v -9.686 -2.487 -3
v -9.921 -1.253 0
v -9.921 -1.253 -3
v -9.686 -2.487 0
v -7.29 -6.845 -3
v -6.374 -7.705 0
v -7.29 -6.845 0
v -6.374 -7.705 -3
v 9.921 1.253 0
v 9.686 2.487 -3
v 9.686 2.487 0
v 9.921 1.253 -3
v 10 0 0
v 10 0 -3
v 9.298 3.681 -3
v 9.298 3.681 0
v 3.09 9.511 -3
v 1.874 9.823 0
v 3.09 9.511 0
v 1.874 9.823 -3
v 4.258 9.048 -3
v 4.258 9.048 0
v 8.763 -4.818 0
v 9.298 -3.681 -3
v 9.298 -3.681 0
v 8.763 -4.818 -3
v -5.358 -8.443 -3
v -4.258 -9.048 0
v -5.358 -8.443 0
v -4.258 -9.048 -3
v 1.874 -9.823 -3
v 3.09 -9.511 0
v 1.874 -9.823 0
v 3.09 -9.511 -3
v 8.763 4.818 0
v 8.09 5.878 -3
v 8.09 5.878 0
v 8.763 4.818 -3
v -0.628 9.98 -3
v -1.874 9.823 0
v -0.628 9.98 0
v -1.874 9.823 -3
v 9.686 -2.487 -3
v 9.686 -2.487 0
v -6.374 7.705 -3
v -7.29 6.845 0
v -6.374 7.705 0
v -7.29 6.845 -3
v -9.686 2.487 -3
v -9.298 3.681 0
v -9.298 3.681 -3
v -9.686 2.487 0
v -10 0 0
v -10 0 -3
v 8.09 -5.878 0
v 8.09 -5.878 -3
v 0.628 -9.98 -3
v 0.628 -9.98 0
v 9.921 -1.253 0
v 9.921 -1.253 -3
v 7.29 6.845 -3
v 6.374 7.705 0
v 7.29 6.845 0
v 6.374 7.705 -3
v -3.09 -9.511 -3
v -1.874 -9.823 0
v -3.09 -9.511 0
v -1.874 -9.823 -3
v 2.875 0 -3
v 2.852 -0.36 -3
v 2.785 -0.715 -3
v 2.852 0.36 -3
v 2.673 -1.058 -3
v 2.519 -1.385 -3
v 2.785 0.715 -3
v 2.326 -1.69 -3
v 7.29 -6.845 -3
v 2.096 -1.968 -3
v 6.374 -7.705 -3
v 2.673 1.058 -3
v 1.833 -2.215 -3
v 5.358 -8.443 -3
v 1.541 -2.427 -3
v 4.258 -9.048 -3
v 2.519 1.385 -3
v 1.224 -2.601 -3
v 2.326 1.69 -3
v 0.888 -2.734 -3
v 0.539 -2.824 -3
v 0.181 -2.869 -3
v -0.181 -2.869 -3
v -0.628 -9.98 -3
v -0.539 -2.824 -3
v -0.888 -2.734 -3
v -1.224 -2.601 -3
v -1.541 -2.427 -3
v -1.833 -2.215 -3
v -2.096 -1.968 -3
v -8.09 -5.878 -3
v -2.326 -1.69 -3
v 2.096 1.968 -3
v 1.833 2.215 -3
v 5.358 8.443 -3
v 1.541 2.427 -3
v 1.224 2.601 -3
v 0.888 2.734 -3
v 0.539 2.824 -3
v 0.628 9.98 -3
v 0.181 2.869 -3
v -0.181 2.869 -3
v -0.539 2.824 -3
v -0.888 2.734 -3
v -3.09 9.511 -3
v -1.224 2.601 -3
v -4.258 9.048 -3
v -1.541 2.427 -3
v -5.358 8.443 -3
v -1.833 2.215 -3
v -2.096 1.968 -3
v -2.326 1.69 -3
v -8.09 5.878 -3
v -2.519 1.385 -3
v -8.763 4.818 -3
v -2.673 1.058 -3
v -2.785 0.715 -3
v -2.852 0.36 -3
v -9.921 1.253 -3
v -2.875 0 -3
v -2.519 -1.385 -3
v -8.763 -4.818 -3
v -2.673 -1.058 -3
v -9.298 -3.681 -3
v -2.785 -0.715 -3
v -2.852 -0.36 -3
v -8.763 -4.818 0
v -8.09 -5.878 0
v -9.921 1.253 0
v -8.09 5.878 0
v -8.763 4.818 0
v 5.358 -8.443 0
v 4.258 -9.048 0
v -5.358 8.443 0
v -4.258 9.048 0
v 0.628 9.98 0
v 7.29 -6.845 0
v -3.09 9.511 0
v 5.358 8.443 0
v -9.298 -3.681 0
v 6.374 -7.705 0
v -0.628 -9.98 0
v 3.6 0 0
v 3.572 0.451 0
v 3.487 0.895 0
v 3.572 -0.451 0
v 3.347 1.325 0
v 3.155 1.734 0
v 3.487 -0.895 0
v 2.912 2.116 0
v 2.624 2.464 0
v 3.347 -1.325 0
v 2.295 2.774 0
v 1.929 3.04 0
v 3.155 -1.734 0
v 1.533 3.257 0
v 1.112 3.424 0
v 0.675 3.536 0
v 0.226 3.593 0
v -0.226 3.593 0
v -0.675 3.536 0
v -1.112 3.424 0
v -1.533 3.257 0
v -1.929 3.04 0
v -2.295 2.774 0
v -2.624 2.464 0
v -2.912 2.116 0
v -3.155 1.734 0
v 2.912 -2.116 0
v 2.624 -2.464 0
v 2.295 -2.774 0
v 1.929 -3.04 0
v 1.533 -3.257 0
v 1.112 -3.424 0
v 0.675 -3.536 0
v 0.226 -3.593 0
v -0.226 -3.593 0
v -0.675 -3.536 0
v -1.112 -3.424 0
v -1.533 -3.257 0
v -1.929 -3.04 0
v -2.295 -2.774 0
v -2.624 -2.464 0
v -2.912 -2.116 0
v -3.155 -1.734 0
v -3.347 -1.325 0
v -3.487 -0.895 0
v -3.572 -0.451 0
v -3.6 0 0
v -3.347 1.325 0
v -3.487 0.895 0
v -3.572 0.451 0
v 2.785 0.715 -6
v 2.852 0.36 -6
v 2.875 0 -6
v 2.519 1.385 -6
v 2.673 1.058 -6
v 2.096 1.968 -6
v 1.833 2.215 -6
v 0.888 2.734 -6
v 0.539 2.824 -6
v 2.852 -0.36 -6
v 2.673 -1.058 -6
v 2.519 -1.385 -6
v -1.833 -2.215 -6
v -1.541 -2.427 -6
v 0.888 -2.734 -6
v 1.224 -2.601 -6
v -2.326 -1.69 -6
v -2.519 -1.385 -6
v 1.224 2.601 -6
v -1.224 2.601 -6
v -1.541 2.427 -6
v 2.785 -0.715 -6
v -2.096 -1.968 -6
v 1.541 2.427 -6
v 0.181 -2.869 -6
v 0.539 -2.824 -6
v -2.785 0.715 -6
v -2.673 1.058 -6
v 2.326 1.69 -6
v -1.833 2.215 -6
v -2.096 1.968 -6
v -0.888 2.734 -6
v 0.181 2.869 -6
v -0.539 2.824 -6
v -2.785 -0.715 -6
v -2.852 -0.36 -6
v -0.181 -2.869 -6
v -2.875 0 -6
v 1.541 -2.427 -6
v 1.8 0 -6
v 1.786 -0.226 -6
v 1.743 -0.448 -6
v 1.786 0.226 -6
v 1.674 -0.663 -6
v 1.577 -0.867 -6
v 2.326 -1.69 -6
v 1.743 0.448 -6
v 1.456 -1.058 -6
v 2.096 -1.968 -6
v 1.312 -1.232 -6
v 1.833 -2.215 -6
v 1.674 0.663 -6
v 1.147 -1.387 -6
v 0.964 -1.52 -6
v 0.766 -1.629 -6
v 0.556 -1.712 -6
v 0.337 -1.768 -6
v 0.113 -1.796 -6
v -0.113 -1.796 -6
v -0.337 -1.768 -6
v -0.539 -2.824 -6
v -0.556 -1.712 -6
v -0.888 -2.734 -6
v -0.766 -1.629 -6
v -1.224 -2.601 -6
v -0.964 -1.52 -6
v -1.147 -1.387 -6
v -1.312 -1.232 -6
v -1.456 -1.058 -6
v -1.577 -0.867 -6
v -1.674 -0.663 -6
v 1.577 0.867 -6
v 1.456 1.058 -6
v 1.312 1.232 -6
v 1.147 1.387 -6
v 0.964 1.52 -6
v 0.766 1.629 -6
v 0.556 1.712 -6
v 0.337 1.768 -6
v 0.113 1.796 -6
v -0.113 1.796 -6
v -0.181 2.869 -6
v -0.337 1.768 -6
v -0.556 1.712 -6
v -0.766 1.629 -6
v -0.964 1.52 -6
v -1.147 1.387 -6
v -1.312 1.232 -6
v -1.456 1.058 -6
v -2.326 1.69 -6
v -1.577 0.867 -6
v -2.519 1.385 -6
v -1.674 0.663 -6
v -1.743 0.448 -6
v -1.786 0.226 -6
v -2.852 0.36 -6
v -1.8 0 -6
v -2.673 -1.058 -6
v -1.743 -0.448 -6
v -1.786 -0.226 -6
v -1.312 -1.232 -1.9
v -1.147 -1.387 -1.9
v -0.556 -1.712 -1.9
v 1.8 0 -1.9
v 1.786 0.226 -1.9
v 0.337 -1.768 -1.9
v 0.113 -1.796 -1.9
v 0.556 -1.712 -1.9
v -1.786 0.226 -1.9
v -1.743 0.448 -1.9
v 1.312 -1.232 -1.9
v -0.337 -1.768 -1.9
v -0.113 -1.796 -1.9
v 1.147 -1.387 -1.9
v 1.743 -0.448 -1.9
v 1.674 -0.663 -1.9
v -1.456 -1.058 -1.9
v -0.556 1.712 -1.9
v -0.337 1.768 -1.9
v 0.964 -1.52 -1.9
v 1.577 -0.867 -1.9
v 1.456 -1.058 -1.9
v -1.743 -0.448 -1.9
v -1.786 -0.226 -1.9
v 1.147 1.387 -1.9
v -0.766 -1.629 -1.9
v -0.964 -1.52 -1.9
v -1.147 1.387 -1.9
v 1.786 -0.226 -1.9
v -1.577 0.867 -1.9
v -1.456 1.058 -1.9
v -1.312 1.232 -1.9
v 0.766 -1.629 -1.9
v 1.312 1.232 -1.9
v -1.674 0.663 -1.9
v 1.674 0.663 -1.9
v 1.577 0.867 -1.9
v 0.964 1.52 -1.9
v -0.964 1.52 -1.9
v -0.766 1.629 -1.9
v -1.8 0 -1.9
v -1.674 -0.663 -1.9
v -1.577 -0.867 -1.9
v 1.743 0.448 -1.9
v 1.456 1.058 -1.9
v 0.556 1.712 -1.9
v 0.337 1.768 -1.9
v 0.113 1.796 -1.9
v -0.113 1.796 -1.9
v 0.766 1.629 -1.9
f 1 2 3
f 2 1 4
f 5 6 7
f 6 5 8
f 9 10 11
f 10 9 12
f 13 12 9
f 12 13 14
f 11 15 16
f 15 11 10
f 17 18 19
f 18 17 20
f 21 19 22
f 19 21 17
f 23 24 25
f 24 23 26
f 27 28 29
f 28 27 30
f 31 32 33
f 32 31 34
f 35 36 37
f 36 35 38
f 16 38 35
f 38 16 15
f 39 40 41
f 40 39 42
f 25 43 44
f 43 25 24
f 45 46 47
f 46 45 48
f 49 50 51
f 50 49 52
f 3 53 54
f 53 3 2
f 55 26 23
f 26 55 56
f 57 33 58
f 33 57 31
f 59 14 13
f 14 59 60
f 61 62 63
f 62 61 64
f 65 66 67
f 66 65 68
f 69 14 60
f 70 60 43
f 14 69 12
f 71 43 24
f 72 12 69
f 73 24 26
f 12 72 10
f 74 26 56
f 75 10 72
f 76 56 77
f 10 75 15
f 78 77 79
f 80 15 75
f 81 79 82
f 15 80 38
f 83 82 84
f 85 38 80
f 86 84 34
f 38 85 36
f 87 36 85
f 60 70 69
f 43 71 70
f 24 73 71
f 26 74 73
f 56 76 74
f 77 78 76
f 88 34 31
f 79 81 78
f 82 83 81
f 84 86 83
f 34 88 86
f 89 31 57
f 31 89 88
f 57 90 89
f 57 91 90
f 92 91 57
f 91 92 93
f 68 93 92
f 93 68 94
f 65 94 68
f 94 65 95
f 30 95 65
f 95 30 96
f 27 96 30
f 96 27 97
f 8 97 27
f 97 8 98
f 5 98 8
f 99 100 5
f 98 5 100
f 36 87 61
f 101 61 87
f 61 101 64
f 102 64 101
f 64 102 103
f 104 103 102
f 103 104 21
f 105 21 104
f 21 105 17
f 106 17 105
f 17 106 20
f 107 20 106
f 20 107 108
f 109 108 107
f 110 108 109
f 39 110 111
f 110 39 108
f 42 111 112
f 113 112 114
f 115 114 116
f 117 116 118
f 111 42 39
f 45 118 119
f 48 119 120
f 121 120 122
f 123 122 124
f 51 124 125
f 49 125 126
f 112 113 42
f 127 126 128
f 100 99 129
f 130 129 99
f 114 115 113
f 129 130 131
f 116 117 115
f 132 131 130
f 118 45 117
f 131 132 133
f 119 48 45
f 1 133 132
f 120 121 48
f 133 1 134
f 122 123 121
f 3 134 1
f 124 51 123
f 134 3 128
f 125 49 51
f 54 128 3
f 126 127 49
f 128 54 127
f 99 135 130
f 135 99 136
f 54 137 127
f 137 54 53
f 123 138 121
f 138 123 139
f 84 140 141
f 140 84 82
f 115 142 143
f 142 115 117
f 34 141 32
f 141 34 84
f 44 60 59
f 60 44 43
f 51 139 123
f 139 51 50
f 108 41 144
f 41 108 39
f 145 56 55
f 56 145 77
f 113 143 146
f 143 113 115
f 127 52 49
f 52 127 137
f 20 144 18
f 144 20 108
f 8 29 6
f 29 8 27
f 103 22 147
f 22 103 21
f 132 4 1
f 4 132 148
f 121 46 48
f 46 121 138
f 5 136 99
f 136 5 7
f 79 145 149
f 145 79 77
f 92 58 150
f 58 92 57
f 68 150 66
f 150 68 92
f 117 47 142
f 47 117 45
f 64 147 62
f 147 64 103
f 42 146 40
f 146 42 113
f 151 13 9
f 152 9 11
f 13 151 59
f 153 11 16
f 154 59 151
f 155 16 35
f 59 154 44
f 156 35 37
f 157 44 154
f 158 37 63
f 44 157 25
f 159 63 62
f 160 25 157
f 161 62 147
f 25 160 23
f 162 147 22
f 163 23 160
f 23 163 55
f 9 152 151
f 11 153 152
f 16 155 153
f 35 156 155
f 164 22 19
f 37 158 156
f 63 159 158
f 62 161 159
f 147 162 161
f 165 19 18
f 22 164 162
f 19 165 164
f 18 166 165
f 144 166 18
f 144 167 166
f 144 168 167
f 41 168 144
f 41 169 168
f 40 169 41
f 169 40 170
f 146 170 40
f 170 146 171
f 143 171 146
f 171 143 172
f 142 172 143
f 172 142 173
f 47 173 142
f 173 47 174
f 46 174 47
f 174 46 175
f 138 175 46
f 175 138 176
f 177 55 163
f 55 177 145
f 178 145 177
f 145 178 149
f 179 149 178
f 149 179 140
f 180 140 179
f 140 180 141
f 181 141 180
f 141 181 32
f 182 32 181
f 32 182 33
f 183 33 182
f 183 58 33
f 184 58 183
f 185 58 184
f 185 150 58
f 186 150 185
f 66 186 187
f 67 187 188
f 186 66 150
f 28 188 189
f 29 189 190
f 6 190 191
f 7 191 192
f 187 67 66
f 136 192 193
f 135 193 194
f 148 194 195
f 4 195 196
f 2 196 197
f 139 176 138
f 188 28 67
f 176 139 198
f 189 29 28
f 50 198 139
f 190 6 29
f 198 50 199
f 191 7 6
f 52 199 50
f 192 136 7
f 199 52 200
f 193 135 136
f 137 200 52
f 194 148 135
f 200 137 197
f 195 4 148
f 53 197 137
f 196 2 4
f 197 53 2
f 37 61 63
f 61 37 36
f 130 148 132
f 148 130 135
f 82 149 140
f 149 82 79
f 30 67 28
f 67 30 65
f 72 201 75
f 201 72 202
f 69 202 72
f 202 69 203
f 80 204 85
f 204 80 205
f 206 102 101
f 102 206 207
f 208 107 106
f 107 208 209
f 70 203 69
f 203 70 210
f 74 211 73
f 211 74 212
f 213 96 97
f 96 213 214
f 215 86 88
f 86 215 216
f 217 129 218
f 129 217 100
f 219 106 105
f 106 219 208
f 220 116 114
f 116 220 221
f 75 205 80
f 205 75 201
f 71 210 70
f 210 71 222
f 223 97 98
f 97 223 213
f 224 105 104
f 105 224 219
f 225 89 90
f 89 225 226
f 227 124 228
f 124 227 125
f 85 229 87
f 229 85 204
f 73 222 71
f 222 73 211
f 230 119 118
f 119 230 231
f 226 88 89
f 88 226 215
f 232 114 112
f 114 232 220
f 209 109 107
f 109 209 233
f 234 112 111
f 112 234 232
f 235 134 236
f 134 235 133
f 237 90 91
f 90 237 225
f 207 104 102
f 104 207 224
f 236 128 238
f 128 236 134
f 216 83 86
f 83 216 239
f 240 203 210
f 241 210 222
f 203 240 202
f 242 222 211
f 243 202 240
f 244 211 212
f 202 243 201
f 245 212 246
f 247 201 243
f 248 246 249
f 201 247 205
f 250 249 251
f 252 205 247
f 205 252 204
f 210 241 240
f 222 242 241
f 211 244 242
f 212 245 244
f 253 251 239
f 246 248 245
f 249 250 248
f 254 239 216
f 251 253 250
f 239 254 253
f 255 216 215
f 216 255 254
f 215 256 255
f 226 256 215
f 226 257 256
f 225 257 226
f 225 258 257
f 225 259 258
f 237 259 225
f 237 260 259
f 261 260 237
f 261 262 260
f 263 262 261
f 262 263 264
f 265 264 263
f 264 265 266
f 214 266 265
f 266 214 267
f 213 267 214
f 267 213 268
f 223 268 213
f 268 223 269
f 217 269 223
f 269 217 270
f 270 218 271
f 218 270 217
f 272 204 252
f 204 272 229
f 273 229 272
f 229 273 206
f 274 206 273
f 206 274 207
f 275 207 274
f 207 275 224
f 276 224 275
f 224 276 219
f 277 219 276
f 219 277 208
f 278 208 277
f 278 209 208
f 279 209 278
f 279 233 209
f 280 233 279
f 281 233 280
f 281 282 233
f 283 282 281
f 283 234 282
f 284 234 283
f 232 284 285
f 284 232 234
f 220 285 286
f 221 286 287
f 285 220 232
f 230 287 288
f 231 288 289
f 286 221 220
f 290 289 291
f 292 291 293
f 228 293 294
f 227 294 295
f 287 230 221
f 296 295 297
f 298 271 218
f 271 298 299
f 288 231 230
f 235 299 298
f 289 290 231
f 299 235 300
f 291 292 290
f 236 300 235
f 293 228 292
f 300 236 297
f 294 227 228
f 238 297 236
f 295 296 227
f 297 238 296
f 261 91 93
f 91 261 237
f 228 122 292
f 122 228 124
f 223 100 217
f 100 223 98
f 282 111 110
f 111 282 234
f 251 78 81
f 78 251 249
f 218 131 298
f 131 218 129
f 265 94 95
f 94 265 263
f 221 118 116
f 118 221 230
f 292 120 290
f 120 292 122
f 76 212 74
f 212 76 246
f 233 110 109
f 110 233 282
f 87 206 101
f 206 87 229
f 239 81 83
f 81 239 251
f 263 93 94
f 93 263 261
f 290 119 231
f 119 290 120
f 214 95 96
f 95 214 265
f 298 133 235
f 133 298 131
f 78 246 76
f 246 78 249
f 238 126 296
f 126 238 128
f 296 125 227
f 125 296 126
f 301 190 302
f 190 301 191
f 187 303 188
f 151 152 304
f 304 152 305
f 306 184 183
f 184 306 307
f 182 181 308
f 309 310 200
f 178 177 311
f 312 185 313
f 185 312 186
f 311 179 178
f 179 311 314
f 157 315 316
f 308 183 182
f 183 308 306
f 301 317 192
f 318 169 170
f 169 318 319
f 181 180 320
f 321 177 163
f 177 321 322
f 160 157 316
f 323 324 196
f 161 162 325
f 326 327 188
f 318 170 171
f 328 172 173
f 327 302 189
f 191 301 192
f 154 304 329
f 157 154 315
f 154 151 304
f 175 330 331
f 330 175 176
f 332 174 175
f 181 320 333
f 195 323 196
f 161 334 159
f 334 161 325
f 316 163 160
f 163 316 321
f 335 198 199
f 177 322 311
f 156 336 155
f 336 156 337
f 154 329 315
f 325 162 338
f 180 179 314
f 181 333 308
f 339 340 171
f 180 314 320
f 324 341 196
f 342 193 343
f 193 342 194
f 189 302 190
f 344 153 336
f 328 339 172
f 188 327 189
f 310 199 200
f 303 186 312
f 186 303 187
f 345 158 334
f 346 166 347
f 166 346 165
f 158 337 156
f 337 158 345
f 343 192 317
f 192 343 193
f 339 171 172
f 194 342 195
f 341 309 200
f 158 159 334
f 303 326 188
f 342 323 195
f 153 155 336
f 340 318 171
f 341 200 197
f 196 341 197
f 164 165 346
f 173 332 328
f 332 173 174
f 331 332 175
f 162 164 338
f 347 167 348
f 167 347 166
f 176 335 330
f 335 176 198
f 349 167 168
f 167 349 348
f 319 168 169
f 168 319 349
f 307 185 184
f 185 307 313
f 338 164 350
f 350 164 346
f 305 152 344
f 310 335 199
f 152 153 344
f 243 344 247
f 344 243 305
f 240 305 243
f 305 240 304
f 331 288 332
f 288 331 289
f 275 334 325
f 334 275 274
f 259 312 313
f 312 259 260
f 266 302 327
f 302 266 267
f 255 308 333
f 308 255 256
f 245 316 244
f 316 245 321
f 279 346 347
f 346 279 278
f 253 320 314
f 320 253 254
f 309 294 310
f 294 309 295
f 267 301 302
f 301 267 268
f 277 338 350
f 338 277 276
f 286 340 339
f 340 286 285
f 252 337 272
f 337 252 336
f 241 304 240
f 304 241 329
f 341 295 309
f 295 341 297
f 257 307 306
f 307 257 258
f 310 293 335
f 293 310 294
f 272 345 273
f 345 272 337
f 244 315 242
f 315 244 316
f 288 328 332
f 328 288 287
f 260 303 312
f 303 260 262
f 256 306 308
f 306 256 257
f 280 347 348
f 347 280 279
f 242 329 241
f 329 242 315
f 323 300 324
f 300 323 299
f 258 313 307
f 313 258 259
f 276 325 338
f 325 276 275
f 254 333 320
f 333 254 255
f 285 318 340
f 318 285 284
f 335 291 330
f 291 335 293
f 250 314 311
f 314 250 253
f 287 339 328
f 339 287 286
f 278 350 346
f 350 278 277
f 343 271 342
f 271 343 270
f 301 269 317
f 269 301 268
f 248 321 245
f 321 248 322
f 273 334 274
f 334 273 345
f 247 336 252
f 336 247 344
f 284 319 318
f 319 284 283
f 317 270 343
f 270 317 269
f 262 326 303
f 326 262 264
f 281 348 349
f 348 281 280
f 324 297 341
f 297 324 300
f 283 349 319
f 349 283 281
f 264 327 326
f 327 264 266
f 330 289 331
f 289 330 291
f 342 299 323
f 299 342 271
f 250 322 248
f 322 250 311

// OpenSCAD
$fn = 50;

difference() {
	union() {
		translate(v = [0, 0, -3.0]) {
			cylinder(h = 3, r = 10.0);
		}
		#translate(v = [0, 0, -6.0]) {
			cylinder(h = 6, r = 2.875);
		}
	}
	union() {
		translate(v = [0, 0, 0]) {
			rotate(a = [0, 0, 0]) {
				difference() {
					union() {
						translate(v = [0, 0, -6.0]) {
							cylinder(h = 6, r = 1.5);
						}
						translate(v = [0, 0, -1.9]) {
							cylinder(h = 1.9, r1 = 1.8, r2 = 3.6);
						}
						translate(v = [0, 0, -6.0]) {
							cylinder(h = 6, r = 1.8);
						}
						translate(v = [0, 0, -6.0]) {
							cylinder(h = 6, r = 1.5);
						}
					}
					union();
				}
			}
		}
	}
}
